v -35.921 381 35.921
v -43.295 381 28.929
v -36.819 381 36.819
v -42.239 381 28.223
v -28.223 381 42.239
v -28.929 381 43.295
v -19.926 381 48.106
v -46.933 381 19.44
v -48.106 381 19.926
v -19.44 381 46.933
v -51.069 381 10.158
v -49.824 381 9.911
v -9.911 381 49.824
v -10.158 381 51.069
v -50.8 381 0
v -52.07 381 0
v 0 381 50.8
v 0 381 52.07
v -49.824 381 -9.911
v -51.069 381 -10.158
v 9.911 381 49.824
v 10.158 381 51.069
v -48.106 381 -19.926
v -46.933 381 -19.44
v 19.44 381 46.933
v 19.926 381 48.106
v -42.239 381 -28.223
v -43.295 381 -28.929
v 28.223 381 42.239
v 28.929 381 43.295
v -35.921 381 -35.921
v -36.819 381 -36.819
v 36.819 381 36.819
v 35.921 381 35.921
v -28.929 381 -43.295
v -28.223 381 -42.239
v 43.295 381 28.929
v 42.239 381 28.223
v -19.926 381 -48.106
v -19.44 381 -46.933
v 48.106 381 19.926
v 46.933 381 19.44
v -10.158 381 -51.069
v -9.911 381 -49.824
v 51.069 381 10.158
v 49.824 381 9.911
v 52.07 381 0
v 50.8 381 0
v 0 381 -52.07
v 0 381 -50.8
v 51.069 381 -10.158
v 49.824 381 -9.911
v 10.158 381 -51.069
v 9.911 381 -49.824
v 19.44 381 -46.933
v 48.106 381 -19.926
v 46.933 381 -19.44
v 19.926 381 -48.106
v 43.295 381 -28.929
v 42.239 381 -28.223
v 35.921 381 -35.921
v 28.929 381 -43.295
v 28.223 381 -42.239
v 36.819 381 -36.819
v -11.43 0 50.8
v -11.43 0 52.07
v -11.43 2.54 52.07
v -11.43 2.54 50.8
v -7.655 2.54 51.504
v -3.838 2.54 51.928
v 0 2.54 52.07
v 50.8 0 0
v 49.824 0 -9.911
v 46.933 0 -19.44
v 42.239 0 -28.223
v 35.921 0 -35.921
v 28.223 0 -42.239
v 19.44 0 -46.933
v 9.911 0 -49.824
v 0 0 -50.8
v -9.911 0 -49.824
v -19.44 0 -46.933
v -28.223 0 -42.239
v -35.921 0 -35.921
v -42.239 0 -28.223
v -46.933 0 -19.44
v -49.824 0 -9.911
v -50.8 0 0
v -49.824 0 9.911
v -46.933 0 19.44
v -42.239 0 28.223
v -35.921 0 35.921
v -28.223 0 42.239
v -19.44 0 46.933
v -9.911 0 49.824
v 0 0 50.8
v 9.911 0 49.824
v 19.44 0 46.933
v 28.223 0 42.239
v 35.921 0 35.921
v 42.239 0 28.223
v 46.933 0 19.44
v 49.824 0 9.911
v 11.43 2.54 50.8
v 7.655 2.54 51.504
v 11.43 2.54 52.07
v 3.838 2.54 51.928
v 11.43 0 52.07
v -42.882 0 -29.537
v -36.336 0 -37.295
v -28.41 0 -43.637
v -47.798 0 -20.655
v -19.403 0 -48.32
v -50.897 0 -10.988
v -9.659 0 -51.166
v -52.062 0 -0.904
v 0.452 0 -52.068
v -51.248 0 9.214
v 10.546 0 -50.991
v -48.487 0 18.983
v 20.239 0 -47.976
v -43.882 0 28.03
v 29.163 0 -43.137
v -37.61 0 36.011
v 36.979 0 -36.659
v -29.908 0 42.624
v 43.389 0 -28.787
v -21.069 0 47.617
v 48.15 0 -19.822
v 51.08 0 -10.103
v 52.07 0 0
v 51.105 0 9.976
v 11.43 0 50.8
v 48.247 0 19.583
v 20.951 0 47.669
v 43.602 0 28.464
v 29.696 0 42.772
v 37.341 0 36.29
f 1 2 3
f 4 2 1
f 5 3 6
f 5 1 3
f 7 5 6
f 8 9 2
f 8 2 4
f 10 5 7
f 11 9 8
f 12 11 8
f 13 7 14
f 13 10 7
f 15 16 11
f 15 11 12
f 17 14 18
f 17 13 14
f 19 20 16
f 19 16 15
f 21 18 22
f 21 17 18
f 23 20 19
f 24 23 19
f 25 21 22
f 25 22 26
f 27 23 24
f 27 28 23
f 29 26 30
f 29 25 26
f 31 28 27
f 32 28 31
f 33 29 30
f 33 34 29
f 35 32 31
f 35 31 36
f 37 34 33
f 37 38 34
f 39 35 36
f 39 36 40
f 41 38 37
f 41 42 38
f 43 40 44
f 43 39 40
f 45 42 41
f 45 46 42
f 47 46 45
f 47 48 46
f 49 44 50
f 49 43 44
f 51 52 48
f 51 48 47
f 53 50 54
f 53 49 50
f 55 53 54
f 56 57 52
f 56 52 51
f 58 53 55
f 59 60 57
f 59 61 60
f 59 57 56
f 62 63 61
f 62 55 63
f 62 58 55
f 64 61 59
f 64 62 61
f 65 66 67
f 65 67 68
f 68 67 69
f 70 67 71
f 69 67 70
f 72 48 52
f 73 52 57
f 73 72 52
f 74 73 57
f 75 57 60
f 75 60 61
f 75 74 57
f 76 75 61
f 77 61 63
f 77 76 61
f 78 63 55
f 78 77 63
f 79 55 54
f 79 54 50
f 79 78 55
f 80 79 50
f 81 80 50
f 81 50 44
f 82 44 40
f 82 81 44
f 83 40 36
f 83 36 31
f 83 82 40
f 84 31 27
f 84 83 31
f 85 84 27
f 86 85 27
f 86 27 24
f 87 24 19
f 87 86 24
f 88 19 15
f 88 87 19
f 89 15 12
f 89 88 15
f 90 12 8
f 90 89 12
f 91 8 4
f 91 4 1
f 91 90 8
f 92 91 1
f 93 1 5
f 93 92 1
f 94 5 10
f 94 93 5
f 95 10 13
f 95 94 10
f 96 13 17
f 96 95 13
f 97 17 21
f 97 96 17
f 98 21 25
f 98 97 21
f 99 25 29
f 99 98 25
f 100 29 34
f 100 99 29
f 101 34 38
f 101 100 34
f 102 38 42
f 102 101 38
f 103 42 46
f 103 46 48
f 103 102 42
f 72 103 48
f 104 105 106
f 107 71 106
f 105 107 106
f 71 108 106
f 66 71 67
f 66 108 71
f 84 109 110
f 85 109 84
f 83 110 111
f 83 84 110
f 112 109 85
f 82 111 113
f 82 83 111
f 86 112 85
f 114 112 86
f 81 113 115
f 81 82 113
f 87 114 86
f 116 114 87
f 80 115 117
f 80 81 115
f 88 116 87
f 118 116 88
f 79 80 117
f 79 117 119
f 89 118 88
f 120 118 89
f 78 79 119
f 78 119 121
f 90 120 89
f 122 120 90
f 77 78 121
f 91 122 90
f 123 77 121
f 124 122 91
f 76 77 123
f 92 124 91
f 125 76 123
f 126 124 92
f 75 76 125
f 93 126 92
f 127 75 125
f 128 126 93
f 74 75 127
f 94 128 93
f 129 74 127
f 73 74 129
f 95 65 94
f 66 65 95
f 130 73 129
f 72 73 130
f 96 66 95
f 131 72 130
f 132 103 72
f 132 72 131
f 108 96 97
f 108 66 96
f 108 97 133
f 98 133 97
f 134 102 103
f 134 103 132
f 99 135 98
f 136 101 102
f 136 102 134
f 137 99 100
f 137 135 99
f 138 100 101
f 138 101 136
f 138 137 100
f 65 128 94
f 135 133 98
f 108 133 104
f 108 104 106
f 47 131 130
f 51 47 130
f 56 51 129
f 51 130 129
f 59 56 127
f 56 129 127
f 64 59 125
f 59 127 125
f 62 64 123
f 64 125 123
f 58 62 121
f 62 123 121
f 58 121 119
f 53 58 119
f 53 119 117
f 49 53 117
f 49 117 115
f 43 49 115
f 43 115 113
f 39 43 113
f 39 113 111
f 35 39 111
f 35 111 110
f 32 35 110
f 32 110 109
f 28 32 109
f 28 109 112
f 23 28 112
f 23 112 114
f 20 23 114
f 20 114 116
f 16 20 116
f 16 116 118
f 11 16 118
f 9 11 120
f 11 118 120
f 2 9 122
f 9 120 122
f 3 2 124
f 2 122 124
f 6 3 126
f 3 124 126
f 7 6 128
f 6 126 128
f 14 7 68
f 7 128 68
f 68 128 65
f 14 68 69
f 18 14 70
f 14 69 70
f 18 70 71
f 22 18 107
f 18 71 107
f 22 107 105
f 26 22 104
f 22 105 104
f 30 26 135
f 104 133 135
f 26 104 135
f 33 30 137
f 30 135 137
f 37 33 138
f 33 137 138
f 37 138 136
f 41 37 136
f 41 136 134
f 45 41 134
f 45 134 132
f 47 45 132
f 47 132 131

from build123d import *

# Parameters (mm, degrees)
SKETCH1_R           = 52.07
SKETCH1_R_2         = 50.8
BOSS_EXTRUDE1_DEPTH = 381
BOSS_EXTRUDE2_DEPTH = 2.54


with BuildPart() as part:
    # Sketch1 → Boss-Extrude1 (new body)
    with BuildSketch(Plane(origin=(0, 0, 0), x_dir=(1, 0, 0), z_dir=(0, 1, 0))):
        Circle(SKETCH1_R)
        Circle(SKETCH1_R_2, mode=Mode.SUBTRACT)
    extrude(amount=BOSS_EXTRUDE1_DEPTH)

    # Sketch2 → Boss-Extrude2 (add)
    with BuildSketch(Plane.XZ):
        with BuildLine():
            ThreePointArc((-11.43, 50.8), (-5.750169563, 51.751526064), (0, 52.07))
            Line((0, 52.07), (-11.43, 52.07))
            Line((-11.43, 52.07), (-11.43, 50.8))
        make_face()
        with BuildLine():
            Line((11.43, 52.07), (0, 52.07))
            ThreePointArc((0, 52.07), (5.750169563, 51.751526064), (11.43, 50.8))
            Line((11.43, 50.8), (11.43, 52.07))
        make_face()
    extrude(amount=-BOSS_EXTRUDE2_DEPTH)


solid = part.part
